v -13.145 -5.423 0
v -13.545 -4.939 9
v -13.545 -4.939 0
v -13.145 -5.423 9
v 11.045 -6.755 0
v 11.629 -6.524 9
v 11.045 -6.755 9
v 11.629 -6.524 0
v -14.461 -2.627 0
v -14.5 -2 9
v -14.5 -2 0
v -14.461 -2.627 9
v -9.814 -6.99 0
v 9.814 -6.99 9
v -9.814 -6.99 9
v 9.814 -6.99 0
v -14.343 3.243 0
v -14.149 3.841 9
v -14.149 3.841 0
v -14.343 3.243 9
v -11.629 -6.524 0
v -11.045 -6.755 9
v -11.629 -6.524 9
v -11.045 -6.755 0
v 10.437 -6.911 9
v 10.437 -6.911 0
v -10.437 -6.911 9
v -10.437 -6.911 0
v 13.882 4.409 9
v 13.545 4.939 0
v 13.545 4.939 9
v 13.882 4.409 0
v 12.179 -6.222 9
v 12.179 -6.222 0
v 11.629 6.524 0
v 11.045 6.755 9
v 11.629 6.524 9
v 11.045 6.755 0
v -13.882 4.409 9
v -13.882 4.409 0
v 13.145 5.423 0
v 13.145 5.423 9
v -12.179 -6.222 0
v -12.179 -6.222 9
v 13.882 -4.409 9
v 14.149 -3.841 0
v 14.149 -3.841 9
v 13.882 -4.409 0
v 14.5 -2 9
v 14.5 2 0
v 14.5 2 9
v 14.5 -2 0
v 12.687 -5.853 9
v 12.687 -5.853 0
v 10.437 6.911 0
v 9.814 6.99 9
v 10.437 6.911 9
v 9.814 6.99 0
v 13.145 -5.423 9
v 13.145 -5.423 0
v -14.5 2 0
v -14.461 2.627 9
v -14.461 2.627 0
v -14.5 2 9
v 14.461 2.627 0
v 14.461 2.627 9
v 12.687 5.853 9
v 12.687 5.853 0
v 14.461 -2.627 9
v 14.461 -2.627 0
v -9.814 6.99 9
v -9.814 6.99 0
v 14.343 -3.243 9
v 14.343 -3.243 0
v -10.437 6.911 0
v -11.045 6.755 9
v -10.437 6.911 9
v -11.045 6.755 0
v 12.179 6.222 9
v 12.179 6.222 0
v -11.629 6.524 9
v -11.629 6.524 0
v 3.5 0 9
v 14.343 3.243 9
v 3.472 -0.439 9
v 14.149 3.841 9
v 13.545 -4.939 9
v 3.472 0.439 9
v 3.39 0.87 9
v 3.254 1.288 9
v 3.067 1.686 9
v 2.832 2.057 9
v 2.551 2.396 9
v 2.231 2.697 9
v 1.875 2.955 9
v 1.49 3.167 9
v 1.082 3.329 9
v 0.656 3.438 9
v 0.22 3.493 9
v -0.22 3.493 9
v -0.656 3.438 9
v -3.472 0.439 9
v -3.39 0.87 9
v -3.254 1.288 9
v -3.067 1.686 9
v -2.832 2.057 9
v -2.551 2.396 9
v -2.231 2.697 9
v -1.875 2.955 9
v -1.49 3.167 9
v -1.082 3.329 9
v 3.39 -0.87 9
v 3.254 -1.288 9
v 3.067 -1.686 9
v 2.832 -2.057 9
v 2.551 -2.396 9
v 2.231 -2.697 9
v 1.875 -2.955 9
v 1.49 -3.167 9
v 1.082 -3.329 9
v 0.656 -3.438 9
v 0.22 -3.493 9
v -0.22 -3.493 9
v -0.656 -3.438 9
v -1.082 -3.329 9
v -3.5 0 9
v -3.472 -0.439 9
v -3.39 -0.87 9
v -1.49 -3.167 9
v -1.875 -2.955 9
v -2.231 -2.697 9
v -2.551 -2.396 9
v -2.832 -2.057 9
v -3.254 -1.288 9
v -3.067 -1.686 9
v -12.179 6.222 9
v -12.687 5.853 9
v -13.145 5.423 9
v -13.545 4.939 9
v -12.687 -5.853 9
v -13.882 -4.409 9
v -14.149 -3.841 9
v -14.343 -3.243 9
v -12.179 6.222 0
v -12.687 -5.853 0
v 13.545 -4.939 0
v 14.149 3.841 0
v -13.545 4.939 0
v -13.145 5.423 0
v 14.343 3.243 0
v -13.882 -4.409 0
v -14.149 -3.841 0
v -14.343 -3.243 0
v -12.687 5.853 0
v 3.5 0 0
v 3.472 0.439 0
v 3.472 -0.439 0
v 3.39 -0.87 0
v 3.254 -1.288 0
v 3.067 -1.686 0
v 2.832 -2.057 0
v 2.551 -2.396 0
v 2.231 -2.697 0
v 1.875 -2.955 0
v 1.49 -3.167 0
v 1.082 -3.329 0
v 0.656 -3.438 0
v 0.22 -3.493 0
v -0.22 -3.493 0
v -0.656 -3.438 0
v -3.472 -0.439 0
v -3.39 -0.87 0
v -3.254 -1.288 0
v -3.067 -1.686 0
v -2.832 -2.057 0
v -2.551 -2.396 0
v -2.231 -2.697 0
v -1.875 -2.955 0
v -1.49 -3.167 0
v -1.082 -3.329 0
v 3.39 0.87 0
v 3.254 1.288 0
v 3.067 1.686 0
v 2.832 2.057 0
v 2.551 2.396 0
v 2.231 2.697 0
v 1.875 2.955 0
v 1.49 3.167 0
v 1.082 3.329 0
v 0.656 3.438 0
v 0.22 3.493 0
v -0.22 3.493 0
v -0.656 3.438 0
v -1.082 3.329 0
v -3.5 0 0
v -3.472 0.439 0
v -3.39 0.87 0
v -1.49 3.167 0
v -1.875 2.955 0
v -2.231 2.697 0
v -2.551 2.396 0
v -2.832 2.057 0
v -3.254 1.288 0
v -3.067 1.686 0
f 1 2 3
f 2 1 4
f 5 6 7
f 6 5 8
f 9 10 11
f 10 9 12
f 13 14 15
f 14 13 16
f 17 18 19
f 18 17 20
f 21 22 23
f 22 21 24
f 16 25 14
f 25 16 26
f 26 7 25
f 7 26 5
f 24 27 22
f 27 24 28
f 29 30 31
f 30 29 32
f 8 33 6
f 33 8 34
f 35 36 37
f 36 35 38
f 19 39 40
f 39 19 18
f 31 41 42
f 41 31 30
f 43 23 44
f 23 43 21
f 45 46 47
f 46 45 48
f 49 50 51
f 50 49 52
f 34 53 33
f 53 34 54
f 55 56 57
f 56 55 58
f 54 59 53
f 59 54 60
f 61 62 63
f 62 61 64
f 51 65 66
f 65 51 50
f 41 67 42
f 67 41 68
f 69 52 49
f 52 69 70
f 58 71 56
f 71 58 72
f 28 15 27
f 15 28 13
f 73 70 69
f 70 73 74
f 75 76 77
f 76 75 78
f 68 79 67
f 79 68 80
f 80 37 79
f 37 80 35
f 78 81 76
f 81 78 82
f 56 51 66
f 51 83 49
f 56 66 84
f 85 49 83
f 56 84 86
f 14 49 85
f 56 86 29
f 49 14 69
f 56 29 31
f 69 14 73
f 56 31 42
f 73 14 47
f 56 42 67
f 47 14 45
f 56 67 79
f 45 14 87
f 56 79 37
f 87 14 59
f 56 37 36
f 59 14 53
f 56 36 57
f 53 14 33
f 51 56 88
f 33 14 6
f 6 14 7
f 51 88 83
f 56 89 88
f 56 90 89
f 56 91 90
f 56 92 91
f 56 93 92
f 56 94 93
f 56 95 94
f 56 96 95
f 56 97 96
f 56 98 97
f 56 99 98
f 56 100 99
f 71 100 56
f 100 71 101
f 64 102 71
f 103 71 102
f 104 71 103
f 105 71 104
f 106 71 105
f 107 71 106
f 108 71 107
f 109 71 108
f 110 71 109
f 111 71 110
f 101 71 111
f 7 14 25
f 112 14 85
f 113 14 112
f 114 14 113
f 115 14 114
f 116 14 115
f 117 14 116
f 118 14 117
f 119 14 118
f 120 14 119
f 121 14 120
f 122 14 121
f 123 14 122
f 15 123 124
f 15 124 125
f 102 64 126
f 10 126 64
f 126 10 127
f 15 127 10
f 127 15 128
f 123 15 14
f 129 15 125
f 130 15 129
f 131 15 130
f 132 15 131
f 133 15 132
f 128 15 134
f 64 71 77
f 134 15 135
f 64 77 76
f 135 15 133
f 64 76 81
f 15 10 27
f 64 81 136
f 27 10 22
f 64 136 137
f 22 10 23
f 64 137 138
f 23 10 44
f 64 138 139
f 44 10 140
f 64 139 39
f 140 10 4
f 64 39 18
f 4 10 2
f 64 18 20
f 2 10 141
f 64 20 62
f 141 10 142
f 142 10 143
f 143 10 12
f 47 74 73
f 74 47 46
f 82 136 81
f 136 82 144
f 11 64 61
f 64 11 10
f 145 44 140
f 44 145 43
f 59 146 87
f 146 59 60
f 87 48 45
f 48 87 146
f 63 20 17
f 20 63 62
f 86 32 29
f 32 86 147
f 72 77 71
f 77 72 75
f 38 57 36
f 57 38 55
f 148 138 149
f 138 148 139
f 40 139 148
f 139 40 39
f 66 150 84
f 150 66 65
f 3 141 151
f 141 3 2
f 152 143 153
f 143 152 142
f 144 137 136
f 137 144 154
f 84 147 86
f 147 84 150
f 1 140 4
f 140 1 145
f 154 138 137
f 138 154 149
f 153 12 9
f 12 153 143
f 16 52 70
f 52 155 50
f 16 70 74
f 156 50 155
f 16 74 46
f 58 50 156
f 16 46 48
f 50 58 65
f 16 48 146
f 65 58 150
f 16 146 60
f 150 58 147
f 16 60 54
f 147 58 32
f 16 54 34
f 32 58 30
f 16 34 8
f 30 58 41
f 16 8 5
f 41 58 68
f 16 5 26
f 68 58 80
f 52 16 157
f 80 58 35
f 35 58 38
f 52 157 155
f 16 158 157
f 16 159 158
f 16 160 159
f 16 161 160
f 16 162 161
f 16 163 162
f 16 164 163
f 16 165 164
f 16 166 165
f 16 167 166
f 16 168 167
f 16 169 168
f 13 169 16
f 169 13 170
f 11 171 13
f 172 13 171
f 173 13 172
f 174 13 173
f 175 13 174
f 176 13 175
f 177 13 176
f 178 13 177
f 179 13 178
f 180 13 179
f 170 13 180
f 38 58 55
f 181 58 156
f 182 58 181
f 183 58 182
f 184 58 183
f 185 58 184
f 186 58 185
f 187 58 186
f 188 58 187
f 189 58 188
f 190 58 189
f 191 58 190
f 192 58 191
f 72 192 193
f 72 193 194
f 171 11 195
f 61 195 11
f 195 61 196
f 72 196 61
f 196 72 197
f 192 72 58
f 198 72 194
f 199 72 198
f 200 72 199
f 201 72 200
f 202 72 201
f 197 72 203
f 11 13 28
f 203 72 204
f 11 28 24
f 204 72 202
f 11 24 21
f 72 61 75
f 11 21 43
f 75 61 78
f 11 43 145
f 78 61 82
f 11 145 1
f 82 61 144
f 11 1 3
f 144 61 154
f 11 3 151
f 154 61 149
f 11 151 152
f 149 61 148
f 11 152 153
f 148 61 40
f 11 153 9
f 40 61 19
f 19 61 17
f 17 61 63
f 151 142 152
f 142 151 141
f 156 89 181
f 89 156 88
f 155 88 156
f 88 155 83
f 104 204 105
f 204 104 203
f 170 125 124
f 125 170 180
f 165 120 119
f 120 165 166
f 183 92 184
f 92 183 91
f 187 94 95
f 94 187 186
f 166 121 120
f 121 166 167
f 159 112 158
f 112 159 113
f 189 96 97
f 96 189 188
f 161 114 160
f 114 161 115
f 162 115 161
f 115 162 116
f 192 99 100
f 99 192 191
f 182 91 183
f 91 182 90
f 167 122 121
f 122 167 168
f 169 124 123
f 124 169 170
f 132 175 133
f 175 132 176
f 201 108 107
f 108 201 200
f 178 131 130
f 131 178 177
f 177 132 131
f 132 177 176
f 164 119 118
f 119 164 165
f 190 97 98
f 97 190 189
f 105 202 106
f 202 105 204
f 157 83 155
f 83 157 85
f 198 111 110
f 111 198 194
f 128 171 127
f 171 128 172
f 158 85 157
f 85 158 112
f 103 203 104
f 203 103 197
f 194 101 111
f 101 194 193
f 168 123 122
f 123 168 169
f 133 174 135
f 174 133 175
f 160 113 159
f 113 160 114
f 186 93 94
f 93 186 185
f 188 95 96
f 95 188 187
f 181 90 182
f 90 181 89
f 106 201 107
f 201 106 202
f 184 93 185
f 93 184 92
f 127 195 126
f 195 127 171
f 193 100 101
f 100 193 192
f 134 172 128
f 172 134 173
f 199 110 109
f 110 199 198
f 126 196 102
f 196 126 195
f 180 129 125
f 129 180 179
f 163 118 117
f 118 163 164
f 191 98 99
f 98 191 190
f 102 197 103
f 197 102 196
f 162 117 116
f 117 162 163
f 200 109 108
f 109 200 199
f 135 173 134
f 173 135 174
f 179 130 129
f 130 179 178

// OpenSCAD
$fn = 50;

difference() {
	union() {
		hull() {
			translate(v = [-9.5, 2.0, 0]) {
				cylinder(h = 9, r = 5);
			}
			translate(v = [9.5, 2.0, 0]) {
				cylinder(h = 9, r = 5);
			}
			translate(v = [-9.5, -2.0, 0]) {
				cylinder(h = 9, r = 5);
			}
			translate(v = [9.5, -2.0, 0]) {
				cylinder(h = 9, r = 5);
			}
		}
	}
	union() {
		cylinder(h = 9, r = 3.5);
	}
}
